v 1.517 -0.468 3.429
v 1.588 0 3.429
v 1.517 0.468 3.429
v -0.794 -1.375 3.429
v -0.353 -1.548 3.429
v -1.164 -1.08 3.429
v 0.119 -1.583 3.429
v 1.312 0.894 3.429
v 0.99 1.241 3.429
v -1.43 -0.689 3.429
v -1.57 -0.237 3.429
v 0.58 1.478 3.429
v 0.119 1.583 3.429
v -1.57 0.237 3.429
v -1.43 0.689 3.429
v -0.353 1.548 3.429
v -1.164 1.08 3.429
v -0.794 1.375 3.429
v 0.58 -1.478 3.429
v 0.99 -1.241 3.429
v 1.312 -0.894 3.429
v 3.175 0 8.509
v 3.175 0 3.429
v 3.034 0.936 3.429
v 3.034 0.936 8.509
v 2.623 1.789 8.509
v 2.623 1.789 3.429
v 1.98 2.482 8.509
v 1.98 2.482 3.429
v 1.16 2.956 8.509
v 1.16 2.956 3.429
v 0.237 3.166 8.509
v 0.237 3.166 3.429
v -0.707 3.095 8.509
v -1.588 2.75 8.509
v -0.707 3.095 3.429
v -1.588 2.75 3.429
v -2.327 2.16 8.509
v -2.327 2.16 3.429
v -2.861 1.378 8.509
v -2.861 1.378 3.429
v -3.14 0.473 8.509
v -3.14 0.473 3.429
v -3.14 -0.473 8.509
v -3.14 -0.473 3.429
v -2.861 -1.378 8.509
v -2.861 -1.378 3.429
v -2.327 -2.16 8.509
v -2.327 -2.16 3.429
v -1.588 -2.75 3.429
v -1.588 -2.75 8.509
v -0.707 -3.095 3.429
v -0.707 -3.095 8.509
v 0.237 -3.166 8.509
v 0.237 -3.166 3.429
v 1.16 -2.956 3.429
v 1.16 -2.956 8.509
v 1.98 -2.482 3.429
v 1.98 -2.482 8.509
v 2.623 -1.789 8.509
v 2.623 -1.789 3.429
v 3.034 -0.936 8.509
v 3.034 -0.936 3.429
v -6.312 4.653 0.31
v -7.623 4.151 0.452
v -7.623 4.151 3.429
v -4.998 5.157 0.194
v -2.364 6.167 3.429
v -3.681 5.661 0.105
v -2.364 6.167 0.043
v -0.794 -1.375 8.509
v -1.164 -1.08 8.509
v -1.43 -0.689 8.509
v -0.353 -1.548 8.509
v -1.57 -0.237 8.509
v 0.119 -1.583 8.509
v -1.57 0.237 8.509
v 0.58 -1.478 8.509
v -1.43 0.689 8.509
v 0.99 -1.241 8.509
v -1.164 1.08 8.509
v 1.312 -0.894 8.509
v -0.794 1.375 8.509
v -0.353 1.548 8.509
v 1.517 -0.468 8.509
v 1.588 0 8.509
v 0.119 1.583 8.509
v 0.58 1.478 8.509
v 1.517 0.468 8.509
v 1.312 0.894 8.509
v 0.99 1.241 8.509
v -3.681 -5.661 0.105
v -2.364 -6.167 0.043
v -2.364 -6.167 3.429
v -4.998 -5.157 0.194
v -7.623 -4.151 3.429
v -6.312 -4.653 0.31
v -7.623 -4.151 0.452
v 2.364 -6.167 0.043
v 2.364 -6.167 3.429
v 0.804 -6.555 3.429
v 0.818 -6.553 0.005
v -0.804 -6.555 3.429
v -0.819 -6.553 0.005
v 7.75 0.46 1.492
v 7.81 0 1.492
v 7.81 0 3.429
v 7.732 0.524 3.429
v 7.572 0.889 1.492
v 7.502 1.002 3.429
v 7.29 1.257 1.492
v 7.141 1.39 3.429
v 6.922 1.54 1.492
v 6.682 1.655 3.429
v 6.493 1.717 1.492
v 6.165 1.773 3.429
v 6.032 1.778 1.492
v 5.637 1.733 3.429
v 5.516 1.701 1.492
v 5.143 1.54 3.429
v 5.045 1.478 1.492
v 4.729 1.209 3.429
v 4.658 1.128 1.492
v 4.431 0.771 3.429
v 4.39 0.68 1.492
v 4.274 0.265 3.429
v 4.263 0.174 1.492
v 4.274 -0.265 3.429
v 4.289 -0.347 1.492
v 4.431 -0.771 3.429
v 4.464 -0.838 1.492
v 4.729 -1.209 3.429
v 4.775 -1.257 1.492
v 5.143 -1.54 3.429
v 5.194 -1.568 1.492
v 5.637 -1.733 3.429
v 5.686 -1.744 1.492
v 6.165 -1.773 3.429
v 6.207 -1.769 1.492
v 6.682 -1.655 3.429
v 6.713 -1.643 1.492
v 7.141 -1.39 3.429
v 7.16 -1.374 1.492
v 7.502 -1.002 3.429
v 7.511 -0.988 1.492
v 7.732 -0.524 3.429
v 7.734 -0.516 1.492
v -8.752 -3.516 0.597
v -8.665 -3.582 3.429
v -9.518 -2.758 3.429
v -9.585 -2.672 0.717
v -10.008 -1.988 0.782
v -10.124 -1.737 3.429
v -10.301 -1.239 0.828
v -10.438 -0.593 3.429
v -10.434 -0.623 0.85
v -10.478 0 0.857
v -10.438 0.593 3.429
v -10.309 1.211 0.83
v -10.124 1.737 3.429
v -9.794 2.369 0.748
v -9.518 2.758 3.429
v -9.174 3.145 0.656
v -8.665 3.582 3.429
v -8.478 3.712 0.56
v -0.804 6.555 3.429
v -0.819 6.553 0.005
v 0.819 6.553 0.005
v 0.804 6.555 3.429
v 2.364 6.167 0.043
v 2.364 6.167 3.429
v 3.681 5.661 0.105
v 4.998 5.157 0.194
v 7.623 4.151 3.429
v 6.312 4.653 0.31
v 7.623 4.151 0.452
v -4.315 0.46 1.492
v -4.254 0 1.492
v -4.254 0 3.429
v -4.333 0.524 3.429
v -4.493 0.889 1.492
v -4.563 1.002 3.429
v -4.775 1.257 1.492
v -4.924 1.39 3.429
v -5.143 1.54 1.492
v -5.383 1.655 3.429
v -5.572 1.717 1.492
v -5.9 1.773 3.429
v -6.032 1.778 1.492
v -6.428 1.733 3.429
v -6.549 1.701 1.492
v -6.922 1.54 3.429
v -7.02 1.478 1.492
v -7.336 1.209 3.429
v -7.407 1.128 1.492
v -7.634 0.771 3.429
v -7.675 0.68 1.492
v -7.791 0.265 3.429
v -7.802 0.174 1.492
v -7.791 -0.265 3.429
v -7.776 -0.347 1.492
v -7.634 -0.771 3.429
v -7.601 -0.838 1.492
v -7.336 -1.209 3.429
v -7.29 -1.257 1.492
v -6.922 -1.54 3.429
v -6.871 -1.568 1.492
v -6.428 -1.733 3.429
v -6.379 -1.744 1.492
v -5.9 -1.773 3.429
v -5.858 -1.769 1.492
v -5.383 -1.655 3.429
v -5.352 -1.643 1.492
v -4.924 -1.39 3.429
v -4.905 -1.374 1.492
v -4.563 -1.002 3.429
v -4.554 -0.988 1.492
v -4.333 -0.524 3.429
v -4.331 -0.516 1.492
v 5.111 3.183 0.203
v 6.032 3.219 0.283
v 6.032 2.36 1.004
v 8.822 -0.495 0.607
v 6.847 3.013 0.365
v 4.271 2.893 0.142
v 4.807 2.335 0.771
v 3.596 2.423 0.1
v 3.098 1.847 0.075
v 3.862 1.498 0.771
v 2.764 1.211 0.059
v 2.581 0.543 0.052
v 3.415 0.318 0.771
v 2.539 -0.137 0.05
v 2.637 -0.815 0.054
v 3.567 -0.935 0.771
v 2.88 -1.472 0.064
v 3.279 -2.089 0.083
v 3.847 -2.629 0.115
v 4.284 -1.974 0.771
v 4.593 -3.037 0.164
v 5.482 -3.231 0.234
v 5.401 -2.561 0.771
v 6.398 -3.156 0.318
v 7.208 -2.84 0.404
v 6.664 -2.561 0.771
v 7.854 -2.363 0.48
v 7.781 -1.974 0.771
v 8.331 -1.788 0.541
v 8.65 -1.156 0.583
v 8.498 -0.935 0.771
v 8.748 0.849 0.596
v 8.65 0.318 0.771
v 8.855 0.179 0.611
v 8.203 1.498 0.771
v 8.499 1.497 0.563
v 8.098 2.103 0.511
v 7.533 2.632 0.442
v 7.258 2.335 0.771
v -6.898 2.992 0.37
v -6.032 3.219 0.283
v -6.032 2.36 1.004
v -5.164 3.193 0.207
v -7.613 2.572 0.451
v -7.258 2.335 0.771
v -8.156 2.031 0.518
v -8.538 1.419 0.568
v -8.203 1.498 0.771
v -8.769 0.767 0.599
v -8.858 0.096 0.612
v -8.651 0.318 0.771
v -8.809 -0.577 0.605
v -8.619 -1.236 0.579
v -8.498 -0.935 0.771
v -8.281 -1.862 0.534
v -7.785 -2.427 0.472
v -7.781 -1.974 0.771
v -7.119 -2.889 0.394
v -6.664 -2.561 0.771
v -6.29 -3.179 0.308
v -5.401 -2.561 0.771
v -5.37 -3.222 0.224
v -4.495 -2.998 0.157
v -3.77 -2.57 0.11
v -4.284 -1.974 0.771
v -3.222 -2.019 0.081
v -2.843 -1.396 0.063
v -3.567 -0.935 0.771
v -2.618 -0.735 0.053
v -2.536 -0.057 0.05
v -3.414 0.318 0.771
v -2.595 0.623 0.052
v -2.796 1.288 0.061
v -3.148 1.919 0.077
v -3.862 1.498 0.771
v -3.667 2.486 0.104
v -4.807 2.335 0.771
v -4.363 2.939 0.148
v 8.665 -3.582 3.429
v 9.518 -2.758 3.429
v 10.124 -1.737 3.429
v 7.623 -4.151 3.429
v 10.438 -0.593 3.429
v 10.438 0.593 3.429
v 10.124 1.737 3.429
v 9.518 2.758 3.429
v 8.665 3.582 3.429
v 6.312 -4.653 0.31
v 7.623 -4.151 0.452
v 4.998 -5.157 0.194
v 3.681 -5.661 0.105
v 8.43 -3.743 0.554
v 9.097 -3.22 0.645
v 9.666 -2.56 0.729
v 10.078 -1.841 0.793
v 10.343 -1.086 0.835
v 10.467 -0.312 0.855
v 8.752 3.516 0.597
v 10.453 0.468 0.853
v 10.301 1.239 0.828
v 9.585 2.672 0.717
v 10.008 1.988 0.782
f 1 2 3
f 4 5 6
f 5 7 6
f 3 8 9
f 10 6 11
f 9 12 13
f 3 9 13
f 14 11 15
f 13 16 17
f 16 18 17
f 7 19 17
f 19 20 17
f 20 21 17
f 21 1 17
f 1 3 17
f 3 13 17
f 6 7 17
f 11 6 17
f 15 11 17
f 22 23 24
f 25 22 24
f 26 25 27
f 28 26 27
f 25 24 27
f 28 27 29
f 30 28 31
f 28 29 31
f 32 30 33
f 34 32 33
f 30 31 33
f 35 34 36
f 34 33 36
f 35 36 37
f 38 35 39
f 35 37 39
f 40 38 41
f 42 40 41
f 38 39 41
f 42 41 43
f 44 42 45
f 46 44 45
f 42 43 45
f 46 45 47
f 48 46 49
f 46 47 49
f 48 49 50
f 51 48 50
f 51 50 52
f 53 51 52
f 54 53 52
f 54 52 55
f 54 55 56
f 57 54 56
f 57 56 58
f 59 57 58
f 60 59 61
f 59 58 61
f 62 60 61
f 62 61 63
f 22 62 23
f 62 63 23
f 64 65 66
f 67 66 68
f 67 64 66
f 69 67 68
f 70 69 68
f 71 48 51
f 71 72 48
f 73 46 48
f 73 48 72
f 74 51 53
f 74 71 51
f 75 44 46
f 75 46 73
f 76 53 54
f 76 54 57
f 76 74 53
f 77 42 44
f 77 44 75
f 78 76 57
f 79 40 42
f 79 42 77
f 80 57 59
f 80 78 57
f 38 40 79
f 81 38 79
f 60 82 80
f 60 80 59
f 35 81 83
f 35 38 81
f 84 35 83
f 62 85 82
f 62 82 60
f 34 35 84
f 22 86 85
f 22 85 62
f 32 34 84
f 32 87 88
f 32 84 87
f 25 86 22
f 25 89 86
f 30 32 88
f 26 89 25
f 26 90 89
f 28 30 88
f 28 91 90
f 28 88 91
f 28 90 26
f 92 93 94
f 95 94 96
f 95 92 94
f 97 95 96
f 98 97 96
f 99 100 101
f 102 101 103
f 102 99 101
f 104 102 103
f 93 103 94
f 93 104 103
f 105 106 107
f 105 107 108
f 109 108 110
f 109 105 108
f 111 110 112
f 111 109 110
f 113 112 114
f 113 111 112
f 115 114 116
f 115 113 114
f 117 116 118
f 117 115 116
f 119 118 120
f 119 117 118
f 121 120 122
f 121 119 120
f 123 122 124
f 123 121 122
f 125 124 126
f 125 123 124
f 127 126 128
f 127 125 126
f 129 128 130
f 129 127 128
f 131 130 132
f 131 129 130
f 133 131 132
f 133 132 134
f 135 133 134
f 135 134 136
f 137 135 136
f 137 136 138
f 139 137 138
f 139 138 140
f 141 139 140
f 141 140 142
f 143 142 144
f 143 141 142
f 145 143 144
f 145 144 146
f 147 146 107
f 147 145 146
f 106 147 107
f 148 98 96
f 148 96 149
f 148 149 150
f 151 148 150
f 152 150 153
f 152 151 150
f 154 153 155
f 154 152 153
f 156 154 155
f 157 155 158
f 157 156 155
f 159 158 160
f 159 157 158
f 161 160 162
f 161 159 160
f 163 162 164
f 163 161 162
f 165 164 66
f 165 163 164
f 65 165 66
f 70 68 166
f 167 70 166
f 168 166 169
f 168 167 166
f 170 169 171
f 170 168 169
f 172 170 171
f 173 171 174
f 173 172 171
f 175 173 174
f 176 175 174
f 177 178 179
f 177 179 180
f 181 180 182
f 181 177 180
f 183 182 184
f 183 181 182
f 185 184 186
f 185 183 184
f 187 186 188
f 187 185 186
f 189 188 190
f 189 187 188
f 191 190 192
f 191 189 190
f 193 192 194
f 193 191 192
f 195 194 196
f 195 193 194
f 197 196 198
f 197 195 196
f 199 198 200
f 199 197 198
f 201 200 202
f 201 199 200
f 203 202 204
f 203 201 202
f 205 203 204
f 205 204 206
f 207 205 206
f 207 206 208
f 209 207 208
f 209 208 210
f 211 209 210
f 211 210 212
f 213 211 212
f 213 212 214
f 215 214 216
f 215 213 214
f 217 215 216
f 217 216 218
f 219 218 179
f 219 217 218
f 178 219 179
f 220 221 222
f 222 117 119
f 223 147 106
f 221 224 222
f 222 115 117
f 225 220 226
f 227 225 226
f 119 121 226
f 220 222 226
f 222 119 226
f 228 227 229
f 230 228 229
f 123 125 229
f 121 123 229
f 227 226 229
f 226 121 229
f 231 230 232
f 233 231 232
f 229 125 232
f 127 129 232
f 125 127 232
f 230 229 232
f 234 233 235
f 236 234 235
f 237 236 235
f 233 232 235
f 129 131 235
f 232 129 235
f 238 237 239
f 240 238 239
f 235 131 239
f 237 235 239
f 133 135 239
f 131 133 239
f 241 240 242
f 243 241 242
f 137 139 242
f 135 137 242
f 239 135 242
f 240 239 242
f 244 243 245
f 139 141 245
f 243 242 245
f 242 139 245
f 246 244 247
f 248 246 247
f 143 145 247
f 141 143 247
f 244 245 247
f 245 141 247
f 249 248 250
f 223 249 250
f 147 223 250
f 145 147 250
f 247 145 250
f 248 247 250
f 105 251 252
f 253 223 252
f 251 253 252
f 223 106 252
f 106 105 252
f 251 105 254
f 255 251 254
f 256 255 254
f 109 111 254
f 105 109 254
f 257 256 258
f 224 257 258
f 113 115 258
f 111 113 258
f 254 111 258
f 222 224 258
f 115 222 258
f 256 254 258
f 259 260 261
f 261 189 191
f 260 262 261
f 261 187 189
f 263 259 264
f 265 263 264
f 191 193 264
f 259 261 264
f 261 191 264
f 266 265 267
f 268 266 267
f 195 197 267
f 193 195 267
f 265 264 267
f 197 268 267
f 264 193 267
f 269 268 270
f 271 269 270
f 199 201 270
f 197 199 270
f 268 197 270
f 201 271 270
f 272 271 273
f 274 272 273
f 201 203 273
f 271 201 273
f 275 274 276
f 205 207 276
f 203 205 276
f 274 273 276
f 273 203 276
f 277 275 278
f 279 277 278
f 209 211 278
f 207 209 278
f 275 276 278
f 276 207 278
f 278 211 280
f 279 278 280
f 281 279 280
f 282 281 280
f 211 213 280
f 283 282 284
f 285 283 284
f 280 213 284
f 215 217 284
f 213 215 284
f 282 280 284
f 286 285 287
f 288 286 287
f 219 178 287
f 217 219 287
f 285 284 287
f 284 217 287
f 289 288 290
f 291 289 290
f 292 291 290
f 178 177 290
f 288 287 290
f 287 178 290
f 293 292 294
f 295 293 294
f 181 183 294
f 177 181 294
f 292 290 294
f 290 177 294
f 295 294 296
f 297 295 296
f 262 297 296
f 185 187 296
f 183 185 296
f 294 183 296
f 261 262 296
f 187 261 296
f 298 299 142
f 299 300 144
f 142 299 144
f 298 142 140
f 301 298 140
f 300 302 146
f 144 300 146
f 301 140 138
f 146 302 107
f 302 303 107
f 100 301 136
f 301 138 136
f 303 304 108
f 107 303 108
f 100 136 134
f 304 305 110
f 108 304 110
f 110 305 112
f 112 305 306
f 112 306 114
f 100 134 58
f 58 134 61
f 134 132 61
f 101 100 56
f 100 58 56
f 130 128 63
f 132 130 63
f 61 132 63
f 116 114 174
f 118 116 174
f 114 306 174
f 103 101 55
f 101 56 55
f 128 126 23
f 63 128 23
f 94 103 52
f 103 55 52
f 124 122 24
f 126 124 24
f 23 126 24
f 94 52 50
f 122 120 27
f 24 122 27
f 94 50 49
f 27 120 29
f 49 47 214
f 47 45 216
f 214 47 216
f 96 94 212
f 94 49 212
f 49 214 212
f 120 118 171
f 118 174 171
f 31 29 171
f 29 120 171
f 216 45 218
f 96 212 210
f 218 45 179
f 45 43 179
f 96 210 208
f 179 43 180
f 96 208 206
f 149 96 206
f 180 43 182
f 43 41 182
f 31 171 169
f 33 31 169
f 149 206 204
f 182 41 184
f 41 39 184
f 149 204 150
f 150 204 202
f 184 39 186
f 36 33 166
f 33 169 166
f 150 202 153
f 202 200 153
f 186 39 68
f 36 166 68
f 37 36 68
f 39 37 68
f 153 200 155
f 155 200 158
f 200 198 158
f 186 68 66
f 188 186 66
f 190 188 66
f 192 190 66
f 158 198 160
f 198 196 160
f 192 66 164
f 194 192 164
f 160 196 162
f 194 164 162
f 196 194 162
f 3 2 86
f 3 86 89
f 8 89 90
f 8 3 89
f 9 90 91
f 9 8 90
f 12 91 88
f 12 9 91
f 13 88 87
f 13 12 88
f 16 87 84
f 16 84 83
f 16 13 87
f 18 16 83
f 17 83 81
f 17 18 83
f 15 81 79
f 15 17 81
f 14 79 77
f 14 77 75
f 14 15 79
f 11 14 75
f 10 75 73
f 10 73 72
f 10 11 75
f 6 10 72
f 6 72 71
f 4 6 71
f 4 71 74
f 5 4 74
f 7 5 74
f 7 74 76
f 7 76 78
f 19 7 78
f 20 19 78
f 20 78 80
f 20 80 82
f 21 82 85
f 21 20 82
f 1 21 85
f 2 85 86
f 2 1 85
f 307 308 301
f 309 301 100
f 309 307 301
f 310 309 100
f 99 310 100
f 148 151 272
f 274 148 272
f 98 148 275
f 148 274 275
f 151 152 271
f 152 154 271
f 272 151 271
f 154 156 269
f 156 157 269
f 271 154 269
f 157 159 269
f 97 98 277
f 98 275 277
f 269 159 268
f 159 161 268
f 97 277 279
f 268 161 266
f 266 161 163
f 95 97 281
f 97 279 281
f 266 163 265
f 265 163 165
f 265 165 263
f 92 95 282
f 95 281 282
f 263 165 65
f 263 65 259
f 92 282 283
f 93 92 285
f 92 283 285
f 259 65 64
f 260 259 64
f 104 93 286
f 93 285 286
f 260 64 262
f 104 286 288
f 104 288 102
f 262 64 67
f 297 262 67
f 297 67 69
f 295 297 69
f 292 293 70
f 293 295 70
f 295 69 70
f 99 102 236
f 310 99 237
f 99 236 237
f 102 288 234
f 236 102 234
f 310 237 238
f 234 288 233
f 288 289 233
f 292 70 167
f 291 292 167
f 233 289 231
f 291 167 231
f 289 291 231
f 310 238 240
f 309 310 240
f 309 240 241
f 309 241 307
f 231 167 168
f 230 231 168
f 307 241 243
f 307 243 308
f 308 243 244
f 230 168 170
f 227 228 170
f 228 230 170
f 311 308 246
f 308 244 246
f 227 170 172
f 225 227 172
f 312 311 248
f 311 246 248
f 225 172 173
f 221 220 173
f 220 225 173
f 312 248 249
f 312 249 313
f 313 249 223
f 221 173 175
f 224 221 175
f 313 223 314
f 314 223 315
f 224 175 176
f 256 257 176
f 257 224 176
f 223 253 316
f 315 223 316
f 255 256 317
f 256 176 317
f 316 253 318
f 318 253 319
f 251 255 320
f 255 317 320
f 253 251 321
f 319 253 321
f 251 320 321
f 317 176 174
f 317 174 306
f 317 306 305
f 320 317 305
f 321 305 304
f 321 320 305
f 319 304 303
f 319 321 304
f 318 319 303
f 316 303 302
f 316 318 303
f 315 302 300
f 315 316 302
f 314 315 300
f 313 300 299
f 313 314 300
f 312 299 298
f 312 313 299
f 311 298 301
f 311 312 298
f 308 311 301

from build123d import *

# Parameters (mm, degrees)
SKETCH3_R          = 1.778
EXTRUDE1_DEPTH     = 3.429
SKETCH4_R          = 3.175
SKETCH4_R_2        = 1.5875
EXTRUDE2_DEPTH     = 5.08
CUT_EXTRUDE2_DEPTH = 38.1


with BuildPart() as part:
    # Sketch3 → Extrude1 (new body)
    with BuildSketch(Plane.XY):
        with BuildLine():
            Line((2.363536842, 6.16656384), (7.623342105, 4.150571816))
            ThreePointArc((7.623342105, 4.150571816), (10.4775, 0), (7.623342105, -4.150571816))
            Line((7.623342105, -4.150571816), (2.363536842, -6.16656384))
            ThreePointArc((2.363536842, -6.16656384), (0, -6.604), (-2.363536842, -6.16656384))
            Line((-2.363536842, -6.16656384), (-7.623342105, -4.150571816))
            ThreePointArc((-7.623342105, -4.150571816), (-10.4775, 0), (-7.623342105, 4.150571816))
            Line((-7.623342105, 4.150571816), (-2.363536842, 6.16656384))
            ThreePointArc((-2.363536842, 6.16656384), (0, 6.604), (2.363536842, 6.16656384))
        make_face()
        with Locations((-6.0325, 0)):
            Circle(SKETCH3_R, mode=Mode.SUBTRACT)
        with Locations((6.0325, 0)):
            Circle(SKETCH3_R, mode=Mode.SUBTRACT)
    extrude(amount=EXTRUDE1_DEPTH)

    # Sketch4 → Extrude2 (add)
    with BuildSketch(Plane.XY.offset(3.429)):
        Circle(SKETCH4_R)
        Circle(SKETCH4_R_2, mode=Mode.SUBTRACT)
    extrude(amount=EXTRUDE2_DEPTH)

    # Cut-Extrude1 cone 1 section (through the dimple's axis) → Cut-Extrude1 (revolve, cut)
    with BuildSketch(Plane.YZ.offset(6.0325)):
        Polygon((0, 0), (3.556, 0), (0, 2.983838288), align=None)
    revolve(axis=Axis((6.0325, 0, 0), (0, 0, 1)), mode=Mode.SUBTRACT)

    # Cut-Extrude1 cone 2 section (through the dimple's axis) → Cut-Extrude1 cone 2 (revolve, cut)
    with BuildSketch(Plane.YZ.offset(-6.0325)):
        Polygon((0, 0), (3.556, 0), (0, 2.983838288), align=None)
    revolve(axis=Axis((-6.0325, 0, 0), (0, 0, 1)), mode=Mode.SUBTRACT)

    # Sketch6 → Cut-Extrude2 (cut, symmetric)
    with BuildSketch(Plane(origin=(0, 0, 0), x_dir=(1, 0, 0), z_dir=(0, 1, 0))):
        with BuildLine():
            Line((10.4775, -0.85725), (10.4775, 0.508))
            Line((10.4775, 0.508), (-10.4775, 0.508))
            Line((-10.4775, 0.508), (-10.4775, -0.85725))
            ThreePointArc((-10.4775, -0.85725), (0, 0), (10.4775, -0.85725))
        make_face()
    extrude(amount=CUT_EXTRUDE2_DEPTH, both=True, mode=Mode.SUBTRACT)


solid = part.part
